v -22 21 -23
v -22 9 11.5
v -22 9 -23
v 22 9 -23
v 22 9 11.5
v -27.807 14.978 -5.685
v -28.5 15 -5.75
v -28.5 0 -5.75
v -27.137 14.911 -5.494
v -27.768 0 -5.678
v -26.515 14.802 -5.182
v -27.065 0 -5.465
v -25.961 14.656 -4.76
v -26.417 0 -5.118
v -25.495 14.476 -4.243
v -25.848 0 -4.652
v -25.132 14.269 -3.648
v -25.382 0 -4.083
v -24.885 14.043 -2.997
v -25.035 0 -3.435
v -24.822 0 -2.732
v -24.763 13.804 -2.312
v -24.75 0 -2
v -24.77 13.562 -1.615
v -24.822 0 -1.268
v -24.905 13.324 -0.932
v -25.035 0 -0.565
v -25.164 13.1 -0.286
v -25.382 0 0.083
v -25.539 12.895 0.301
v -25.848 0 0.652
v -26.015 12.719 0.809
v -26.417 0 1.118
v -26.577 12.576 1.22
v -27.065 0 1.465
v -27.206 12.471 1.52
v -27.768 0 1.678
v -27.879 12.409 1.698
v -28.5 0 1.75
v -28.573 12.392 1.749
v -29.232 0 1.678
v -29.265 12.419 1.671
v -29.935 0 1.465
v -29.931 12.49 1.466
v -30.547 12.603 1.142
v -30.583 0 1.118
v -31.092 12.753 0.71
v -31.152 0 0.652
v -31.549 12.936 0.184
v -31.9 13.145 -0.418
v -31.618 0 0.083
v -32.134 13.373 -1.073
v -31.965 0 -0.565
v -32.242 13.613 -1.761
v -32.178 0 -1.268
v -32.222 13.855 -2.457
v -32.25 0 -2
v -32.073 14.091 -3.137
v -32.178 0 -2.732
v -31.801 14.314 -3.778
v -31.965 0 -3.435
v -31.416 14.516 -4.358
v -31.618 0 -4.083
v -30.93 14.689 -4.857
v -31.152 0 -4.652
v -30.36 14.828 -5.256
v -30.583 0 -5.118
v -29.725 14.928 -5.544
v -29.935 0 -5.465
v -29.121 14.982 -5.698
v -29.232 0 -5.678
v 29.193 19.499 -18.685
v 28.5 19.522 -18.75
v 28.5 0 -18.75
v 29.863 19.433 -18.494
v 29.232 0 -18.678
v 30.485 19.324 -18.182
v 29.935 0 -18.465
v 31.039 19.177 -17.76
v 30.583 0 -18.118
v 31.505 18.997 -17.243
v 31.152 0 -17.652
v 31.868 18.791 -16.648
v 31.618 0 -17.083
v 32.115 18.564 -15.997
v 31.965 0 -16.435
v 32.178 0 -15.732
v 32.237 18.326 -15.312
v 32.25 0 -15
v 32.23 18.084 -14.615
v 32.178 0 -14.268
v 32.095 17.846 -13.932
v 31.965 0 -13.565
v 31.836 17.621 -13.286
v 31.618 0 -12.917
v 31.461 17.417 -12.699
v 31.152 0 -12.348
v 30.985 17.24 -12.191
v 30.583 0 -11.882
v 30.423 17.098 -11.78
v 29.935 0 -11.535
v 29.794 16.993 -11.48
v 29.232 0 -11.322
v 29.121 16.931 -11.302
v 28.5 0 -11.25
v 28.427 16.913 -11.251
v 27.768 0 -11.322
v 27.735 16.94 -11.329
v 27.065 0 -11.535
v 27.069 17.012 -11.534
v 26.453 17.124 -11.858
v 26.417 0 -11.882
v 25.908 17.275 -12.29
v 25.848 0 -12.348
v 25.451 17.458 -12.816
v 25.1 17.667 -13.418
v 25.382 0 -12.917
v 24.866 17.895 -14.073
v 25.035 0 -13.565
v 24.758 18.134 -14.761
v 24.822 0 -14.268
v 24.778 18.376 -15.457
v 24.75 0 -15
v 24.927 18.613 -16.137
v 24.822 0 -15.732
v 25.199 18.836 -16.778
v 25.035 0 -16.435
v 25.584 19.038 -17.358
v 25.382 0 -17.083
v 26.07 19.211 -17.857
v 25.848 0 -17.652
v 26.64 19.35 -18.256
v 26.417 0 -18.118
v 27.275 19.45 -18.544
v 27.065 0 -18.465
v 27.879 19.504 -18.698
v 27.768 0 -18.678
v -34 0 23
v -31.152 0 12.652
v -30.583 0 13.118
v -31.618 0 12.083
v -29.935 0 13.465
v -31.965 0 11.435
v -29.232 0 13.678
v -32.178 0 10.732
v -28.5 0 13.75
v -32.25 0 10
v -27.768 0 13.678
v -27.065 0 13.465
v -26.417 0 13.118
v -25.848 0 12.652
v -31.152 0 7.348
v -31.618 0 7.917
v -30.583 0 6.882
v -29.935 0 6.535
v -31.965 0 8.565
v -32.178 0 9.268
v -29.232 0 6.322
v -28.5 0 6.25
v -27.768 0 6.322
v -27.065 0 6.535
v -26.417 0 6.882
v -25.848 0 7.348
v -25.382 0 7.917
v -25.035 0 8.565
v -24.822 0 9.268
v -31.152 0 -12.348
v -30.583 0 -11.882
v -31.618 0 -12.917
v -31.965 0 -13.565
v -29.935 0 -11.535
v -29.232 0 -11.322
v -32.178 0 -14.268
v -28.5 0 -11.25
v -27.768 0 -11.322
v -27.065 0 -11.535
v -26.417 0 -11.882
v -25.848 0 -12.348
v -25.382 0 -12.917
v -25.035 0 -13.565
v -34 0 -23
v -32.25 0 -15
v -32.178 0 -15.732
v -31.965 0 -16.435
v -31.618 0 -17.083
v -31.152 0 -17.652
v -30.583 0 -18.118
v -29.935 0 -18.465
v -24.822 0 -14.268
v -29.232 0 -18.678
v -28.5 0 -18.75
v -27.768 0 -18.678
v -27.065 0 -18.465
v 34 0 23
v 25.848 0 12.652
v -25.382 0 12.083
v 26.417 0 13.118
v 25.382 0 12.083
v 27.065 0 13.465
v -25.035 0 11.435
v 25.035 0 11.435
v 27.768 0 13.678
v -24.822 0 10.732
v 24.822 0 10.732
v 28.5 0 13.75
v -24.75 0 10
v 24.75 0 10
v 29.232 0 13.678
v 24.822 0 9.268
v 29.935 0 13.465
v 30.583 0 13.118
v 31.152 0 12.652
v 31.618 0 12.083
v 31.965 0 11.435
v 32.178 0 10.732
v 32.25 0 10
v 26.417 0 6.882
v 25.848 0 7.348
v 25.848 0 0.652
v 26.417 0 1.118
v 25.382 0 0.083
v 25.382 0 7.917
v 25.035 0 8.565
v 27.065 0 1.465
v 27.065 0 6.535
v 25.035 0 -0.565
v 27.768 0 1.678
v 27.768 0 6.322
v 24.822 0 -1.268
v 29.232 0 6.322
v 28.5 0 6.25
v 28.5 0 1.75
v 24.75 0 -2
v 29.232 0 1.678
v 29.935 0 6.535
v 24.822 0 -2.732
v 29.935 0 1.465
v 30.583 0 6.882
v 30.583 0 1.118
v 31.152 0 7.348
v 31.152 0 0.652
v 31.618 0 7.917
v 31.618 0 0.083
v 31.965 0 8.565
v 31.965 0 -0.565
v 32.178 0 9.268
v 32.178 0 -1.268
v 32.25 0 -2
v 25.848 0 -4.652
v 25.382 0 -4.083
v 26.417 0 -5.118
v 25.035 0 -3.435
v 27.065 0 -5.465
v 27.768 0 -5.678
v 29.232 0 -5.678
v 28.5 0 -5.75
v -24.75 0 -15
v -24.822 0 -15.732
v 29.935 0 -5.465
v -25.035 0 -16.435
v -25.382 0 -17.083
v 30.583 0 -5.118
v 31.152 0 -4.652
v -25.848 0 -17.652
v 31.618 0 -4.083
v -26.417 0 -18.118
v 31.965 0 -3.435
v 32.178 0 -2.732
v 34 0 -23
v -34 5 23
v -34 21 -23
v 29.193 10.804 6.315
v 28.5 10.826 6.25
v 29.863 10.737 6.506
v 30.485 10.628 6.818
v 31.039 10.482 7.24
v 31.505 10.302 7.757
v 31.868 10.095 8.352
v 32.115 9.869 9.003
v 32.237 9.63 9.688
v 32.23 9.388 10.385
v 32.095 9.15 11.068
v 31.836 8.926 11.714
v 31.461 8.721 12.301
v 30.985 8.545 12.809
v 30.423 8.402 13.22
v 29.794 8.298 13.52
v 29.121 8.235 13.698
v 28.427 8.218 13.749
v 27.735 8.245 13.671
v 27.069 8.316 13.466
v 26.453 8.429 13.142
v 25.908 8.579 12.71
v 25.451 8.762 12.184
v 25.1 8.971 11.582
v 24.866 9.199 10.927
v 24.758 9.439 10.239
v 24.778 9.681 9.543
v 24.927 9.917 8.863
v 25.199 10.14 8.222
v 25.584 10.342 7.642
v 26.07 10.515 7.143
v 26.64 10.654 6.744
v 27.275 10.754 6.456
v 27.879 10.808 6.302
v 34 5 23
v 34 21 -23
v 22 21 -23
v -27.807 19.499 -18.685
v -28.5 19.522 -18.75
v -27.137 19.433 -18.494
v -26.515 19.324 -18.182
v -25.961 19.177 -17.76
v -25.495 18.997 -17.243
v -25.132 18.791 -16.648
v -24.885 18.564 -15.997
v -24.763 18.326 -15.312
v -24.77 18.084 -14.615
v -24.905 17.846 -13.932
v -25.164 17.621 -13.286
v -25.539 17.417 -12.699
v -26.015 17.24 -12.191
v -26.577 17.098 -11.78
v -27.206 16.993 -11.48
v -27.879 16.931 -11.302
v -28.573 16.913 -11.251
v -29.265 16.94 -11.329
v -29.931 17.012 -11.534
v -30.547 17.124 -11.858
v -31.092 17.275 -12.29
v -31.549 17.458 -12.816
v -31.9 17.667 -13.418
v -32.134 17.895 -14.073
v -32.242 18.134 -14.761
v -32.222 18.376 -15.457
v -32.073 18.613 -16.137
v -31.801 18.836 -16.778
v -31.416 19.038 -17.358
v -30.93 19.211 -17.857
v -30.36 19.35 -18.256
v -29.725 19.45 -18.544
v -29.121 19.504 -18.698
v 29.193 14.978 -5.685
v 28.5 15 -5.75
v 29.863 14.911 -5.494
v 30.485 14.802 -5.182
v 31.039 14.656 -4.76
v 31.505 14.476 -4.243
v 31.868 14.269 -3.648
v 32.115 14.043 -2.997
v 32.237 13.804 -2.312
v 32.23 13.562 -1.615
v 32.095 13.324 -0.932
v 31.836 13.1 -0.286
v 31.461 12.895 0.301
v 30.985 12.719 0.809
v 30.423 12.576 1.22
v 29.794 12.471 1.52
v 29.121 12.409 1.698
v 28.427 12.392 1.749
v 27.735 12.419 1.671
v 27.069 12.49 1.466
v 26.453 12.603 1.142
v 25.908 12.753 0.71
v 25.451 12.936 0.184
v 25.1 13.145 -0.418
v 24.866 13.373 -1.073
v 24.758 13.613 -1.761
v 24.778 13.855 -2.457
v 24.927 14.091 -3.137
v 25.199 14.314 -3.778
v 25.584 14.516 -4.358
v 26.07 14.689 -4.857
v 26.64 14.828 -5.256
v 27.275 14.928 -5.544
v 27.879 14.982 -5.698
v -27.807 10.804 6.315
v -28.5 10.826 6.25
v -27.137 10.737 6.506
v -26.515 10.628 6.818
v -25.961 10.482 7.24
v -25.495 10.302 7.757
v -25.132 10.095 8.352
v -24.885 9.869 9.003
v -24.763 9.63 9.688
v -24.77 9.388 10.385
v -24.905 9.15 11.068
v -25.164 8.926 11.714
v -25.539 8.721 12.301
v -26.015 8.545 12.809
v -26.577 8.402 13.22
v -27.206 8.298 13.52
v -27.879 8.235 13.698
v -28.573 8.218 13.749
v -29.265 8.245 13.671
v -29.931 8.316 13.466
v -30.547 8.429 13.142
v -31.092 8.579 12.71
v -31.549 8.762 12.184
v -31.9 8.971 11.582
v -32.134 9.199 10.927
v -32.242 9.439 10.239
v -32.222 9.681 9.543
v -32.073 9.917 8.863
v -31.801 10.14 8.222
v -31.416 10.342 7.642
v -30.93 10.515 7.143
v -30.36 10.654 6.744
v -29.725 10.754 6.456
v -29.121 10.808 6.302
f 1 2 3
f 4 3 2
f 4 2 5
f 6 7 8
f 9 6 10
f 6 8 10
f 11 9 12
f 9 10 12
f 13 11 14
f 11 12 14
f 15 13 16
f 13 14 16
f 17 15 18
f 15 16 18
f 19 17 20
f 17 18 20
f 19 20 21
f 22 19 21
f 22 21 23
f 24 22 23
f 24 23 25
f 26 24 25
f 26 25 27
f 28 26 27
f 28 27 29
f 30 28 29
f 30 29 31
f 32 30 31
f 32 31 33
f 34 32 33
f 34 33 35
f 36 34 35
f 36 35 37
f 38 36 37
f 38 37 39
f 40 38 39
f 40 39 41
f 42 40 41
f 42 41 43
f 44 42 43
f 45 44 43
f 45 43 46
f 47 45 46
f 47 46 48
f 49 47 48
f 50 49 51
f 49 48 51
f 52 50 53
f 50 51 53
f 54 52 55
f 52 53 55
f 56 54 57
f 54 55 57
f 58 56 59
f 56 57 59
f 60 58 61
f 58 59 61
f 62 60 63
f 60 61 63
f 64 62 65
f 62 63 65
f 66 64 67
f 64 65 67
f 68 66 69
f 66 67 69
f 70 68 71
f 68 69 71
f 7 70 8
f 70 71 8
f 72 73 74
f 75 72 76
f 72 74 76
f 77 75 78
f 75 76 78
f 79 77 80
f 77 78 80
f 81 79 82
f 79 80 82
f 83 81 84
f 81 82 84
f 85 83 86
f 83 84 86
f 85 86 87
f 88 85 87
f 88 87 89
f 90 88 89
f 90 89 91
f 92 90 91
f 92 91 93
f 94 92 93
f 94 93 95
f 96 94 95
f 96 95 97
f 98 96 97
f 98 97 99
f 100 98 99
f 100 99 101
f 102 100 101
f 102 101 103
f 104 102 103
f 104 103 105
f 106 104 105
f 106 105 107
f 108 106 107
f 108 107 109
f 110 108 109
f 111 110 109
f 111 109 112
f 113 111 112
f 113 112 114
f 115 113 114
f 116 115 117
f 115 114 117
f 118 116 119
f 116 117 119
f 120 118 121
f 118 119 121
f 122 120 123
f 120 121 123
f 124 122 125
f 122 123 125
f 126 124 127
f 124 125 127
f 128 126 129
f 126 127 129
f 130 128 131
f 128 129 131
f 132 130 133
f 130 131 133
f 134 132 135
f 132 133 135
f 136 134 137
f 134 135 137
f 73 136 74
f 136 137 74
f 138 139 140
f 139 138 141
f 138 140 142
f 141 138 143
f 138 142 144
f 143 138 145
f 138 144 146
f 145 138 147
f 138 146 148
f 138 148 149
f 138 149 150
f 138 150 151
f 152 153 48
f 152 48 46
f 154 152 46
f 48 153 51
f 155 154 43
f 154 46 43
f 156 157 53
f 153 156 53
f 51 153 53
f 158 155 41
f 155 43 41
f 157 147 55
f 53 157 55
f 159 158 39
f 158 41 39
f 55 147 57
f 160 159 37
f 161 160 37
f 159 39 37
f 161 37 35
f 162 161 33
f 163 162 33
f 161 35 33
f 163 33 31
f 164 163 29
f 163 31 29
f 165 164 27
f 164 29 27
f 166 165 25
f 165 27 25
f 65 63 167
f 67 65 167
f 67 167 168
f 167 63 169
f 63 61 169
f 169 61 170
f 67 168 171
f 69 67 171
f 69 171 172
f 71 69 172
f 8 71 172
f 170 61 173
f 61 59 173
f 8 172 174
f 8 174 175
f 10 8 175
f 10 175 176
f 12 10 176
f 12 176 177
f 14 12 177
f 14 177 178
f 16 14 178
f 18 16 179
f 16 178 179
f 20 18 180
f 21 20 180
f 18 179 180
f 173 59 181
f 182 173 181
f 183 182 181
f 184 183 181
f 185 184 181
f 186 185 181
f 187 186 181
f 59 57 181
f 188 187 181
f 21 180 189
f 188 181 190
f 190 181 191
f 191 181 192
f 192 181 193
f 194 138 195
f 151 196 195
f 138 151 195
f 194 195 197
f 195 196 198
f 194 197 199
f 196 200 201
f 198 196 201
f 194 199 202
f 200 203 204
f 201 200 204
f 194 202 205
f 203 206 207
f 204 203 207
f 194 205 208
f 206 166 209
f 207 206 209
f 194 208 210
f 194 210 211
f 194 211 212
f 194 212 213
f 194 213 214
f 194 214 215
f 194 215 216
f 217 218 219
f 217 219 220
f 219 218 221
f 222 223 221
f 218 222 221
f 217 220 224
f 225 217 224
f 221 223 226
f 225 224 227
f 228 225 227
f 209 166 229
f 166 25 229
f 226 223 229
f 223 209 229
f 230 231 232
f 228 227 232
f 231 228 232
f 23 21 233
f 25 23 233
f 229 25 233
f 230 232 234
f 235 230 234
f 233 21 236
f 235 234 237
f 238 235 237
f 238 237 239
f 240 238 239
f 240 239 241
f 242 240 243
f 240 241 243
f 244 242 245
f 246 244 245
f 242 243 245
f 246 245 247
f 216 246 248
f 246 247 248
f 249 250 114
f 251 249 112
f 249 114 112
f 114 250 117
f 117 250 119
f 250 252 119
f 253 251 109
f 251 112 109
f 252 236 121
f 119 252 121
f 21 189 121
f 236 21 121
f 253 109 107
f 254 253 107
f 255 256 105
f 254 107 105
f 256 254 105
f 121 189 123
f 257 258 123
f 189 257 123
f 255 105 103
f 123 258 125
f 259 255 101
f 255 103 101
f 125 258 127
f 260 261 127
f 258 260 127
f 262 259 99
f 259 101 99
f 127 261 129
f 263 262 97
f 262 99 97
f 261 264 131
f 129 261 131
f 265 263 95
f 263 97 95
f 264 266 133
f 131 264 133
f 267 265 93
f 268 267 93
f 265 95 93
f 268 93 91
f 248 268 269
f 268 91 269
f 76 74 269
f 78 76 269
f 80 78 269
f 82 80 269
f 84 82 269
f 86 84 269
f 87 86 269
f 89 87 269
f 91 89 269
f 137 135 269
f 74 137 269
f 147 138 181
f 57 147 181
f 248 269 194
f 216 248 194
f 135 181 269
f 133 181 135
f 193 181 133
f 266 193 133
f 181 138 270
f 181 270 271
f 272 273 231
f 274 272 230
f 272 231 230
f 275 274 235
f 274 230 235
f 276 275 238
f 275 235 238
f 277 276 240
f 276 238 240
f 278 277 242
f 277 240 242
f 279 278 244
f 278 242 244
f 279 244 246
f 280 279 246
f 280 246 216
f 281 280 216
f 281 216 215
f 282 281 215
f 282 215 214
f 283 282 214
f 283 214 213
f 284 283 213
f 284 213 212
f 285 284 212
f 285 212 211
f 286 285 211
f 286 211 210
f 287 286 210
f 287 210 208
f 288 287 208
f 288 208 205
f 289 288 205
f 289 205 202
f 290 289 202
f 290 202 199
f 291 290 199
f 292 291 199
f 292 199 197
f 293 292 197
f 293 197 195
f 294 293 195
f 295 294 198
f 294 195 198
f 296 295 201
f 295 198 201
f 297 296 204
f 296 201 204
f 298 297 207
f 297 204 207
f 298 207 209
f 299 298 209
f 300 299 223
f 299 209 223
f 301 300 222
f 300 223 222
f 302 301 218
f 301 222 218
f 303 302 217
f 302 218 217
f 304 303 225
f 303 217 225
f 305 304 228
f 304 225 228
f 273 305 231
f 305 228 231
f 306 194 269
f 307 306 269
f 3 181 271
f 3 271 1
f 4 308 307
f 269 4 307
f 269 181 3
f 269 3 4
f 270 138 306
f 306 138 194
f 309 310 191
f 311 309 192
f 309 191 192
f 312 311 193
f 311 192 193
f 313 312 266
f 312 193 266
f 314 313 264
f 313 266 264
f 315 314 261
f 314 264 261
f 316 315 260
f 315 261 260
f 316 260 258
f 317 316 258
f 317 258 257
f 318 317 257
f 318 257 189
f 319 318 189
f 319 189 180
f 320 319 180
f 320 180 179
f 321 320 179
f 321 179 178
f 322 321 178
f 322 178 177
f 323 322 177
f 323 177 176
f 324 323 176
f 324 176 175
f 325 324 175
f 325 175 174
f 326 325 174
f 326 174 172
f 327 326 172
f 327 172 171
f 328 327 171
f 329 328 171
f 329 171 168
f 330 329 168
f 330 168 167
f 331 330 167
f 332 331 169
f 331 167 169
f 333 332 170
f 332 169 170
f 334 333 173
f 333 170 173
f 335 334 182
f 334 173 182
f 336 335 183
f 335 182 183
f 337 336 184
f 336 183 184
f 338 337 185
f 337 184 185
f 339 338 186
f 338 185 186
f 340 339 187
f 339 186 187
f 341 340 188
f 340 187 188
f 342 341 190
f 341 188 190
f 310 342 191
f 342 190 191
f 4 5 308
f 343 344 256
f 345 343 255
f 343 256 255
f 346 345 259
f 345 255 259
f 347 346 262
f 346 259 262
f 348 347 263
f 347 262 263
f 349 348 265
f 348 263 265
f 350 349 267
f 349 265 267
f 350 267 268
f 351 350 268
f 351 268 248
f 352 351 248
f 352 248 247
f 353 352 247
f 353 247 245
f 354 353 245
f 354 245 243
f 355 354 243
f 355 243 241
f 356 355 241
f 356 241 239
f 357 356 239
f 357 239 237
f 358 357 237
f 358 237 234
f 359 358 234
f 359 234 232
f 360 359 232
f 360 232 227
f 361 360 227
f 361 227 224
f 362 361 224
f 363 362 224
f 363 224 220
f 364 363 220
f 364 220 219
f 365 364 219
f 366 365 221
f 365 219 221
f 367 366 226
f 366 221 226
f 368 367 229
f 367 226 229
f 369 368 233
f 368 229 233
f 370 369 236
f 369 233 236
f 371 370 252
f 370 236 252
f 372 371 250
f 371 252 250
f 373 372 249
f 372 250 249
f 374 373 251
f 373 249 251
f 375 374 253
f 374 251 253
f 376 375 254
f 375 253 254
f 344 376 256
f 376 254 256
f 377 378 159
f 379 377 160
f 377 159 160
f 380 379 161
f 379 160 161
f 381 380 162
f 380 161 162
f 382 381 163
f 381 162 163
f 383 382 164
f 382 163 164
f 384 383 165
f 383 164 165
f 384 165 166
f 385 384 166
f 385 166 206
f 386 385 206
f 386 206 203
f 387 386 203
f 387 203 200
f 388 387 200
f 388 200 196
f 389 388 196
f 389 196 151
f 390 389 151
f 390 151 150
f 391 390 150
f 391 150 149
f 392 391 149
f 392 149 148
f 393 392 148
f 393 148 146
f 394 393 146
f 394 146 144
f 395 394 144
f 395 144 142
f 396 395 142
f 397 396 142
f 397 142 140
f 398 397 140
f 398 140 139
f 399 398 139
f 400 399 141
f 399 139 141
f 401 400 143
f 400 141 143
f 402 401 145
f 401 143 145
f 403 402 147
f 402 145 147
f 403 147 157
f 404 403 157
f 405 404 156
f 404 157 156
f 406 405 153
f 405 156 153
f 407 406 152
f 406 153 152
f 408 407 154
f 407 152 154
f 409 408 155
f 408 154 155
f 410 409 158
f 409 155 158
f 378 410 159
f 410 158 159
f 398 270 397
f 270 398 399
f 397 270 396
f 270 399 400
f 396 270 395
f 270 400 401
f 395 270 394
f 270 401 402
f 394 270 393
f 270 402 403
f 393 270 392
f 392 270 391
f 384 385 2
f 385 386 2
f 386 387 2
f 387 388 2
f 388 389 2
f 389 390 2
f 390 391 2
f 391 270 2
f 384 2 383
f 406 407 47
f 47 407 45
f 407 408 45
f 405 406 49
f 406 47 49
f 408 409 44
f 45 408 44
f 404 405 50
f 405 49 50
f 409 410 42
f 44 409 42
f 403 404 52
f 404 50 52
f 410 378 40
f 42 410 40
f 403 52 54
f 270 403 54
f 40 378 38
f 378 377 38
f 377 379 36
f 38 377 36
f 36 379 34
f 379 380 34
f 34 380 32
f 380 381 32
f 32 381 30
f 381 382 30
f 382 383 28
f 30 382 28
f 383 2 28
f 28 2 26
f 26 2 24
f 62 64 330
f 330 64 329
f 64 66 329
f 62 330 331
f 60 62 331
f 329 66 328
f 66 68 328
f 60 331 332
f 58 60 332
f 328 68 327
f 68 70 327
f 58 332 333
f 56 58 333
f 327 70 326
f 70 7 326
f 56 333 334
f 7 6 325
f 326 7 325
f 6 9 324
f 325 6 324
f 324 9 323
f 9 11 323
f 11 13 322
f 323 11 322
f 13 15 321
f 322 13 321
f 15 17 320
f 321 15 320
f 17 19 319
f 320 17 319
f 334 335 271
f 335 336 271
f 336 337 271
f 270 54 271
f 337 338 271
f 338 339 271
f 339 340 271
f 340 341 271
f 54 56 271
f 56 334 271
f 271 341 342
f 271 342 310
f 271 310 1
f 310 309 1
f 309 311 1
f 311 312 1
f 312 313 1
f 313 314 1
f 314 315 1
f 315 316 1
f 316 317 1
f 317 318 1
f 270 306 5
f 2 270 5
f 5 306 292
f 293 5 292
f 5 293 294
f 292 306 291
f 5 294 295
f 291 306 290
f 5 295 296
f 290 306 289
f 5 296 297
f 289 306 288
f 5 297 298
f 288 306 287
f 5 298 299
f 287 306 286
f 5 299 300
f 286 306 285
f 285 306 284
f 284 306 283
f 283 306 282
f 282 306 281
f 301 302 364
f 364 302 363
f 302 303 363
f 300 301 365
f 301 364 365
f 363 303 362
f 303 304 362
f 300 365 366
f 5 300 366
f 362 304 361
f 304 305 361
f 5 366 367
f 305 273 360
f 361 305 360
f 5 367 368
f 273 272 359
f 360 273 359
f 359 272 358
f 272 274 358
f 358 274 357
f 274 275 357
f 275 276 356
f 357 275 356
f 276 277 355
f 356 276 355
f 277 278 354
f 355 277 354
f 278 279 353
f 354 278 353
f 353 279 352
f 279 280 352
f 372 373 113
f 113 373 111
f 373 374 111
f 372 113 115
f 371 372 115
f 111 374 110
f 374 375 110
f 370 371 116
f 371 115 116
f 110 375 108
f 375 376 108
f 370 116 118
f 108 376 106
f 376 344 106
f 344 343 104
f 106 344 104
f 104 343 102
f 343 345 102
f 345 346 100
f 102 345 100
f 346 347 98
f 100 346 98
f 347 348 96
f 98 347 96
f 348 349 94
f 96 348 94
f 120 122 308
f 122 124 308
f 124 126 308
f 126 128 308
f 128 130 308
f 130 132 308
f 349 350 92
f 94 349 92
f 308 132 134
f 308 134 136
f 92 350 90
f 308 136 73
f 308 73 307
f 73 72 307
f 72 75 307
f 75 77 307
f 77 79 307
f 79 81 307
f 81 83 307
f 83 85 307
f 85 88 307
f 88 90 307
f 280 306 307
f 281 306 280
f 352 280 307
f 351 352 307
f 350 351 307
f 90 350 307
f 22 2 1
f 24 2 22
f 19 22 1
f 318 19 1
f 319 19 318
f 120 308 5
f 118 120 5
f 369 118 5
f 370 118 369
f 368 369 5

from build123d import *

# Parameters (mm, degrees)
SKETCH1_W           = 68
SKETCH1_H           = 46
BOSS_EXTRUDE1_DEPTH = 67
SKETCH3_W           = 44
SKETCH3_H           = 46
CUT_EXTRUDE2_DEPTH  = 58
CUT_EXTRUDE1_REACH  = 100.194
CUT_EXTRUDE3_REACH  = 48.109
SKETCH4_R           = 3.75


with BuildPart() as part:
    # Sketch1 → Boss-Extrude1 (new body)
    with BuildSketch(Plane(origin=(0, 0, 0), x_dir=(1, 0, 0), z_dir=(0, 1, 0))):
        Rectangle(SKETCH1_W, SKETCH1_H)
    extrude(amount=BOSS_EXTRUDE1_DEPTH)

    # Sketch3 → Cut-Extrude2 (cut)
    with BuildSketch(Plane(origin=(0, 67, 0), x_dir=(1, 0, 0), z_dir=(0, 1, 0))):
        Rectangle(SKETCH3_W, SKETCH3_H)
    extrude(amount=-CUT_EXTRUDE2_DEPTH, mode=Mode.SUBTRACT)

    # Cut-Extrude1: up to this face of the body (flat: up to its plane)
    cut_extrude1_end = Plane(part.part.faces().sort_by_distance((-34, 33.5, 0))[0])
    # Sketch2 → Cut-Extrude1 (cut, up to the picked face)
    with BuildSketch(Plane(origin=(34, 0, 0), x_dir=(0, 0, -1), z_dir=(1, 0, 0)), mode=Mode.PRIVATE) as cut_extrude1_sk1:
        Polygon((-23, 5), (23, 21), (23, 67), (-23, 67), align=None)
    cut_extrude1_tool1 = split(extrude(cut_extrude1_sk1.sketch, amount=-CUT_EXTRUDE1_REACH, mode=Mode.PRIVATE), bisect_by=cut_extrude1_end, keep=Keep.BOTH, mode=Mode.PRIVATE)
    add(cut_extrude1_tool1.solids().sort_by(Axis((34, 39.802469, 1.135802), (-1, 0, 0)))[0], mode=Mode.SUBTRACT)

    # Cut-Extrude3: up to this plane
    cut_extrude3_end = Plane(origin=(-111.201036262, 5, 23), z_dir=(0, -0.9444967967061592, -0.32852062494127277))
    # Sketch4 → Cut-Extrude3 (cut, up to the surface)
    with BuildSketch(Plane(origin=(0, 0, 0), x_dir=(-1, 0, 0), z_dir=(0, -1, 0)), mode=Mode.PRIVATE) as cut_extrude3_sk1:
        with Locations(Location((-28.5, 15, 0), (0, 0, 90))):
            Circle(SKETCH4_R)
    cut_extrude3_tool1 = split(extrude(cut_extrude3_sk1.sketch, amount=-CUT_EXTRUDE3_REACH, mode=Mode.PRIVATE), bisect_by=cut_extrude3_end, keep=Keep.BOTH, mode=Mode.PRIVATE)
    add(cut_extrude3_tool1.solids().sort_by_distance((28.5, 0, -15))[0], mode=Mode.SUBTRACT)
    # Sketch4 → Cut-Extrude3 (cut, up to the surface)
    with BuildSketch(Plane(origin=(0, 0, 0), x_dir=(-1, 0, 0), z_dir=(0, -1, 0)), mode=Mode.PRIVATE) as cut_extrude3_sk2:
        with Locations(Location((-28.5, 2, 0), (0, 0, 90))):
            Circle(SKETCH4_R)
    cut_extrude3_tool2 = split(extrude(cut_extrude3_sk2.sketch, amount=-CUT_EXTRUDE3_REACH, mode=Mode.PRIVATE), bisect_by=cut_extrude3_end, keep=Keep.BOTH, mode=Mode.PRIVATE)
    add(cut_extrude3_tool2.solids().sort_by_distance((28.5, 0, -2))[0], mode=Mode.SUBTRACT)
    # Sketch4 → Cut-Extrude3 (cut, up to the surface)
    with BuildSketch(Plane(origin=(0, 0, 0), x_dir=(-1, 0, 0), z_dir=(0, -1, 0)), mode=Mode.PRIVATE) as cut_extrude3_sk3:
        with Locations(Location((-28.5, -10, 0), (0, 0, 90))):
            Circle(SKETCH4_R)
    cut_extrude3_tool3 = split(extrude(cut_extrude3_sk3.sketch, amount=-CUT_EXTRUDE3_REACH, mode=Mode.PRIVATE), bisect_by=cut_extrude3_end, keep=Keep.BOTH, mode=Mode.PRIVATE)
    add(cut_extrude3_tool3.solids().sort_by_distance((28.5, 0, 10))[0], mode=Mode.SUBTRACT)
    # Sketch4 → Cut-Extrude3 (cut, up to the surface)
    with BuildSketch(Plane(origin=(0, 0, 0), x_dir=(-1, 0, 0), z_dir=(0, -1, 0)), mode=Mode.PRIVATE) as cut_extrude3_sk4:
        with Locations(Location((28.5, 15, 0), (0, 0, 90))):
            Circle(SKETCH4_R)
    cut_extrude3_tool4 = split(extrude(cut_extrude3_sk4.sketch, amount=-CUT_EXTRUDE3_REACH, mode=Mode.PRIVATE), bisect_by=cut_extrude3_end, keep=Keep.BOTH, mode=Mode.PRIVATE)
    add(cut_extrude3_tool4.solids().sort_by_distance((-28.5, 0, -15))[0], mode=Mode.SUBTRACT)
    # Sketch4 → Cut-Extrude3 (cut, up to the surface)
    with BuildSketch(Plane(origin=(0, 0, 0), x_dir=(-1, 0, 0), z_dir=(0, -1, 0)), mode=Mode.PRIVATE) as cut_extrude3_sk5:
        with Locations(Location((28.5, 2, 0), (0, 0, 90))):
            Circle(SKETCH4_R)
    cut_extrude3_tool5 = split(extrude(cut_extrude3_sk5.sketch, amount=-CUT_EXTRUDE3_REACH, mode=Mode.PRIVATE), bisect_by=cut_extrude3_end, keep=Keep.BOTH, mode=Mode.PRIVATE)
    add(cut_extrude3_tool5.solids().sort_by_distance((-28.5, 0, -2))[0], mode=Mode.SUBTRACT)
    # Sketch4 → Cut-Extrude3 (cut, up to the surface)
    with BuildSketch(Plane(origin=(0, 0, 0), x_dir=(-1, 0, 0), z_dir=(0, -1, 0)), mode=Mode.PRIVATE) as cut_extrude3_sk6:
        with Locations(Location((28.5, -10, 0), (0, 0, 90))):
            Circle(SKETCH4_R)
    cut_extrude3_tool6 = split(extrude(cut_extrude3_sk6.sketch, amount=-CUT_EXTRUDE3_REACH, mode=Mode.PRIVATE), bisect_by=cut_extrude3_end, keep=Keep.BOTH, mode=Mode.PRIVATE)
    add(cut_extrude3_tool6.solids().sort_by_distance((-28.5, 0, 10))[0], mode=Mode.SUBTRACT)


solid = part.part
